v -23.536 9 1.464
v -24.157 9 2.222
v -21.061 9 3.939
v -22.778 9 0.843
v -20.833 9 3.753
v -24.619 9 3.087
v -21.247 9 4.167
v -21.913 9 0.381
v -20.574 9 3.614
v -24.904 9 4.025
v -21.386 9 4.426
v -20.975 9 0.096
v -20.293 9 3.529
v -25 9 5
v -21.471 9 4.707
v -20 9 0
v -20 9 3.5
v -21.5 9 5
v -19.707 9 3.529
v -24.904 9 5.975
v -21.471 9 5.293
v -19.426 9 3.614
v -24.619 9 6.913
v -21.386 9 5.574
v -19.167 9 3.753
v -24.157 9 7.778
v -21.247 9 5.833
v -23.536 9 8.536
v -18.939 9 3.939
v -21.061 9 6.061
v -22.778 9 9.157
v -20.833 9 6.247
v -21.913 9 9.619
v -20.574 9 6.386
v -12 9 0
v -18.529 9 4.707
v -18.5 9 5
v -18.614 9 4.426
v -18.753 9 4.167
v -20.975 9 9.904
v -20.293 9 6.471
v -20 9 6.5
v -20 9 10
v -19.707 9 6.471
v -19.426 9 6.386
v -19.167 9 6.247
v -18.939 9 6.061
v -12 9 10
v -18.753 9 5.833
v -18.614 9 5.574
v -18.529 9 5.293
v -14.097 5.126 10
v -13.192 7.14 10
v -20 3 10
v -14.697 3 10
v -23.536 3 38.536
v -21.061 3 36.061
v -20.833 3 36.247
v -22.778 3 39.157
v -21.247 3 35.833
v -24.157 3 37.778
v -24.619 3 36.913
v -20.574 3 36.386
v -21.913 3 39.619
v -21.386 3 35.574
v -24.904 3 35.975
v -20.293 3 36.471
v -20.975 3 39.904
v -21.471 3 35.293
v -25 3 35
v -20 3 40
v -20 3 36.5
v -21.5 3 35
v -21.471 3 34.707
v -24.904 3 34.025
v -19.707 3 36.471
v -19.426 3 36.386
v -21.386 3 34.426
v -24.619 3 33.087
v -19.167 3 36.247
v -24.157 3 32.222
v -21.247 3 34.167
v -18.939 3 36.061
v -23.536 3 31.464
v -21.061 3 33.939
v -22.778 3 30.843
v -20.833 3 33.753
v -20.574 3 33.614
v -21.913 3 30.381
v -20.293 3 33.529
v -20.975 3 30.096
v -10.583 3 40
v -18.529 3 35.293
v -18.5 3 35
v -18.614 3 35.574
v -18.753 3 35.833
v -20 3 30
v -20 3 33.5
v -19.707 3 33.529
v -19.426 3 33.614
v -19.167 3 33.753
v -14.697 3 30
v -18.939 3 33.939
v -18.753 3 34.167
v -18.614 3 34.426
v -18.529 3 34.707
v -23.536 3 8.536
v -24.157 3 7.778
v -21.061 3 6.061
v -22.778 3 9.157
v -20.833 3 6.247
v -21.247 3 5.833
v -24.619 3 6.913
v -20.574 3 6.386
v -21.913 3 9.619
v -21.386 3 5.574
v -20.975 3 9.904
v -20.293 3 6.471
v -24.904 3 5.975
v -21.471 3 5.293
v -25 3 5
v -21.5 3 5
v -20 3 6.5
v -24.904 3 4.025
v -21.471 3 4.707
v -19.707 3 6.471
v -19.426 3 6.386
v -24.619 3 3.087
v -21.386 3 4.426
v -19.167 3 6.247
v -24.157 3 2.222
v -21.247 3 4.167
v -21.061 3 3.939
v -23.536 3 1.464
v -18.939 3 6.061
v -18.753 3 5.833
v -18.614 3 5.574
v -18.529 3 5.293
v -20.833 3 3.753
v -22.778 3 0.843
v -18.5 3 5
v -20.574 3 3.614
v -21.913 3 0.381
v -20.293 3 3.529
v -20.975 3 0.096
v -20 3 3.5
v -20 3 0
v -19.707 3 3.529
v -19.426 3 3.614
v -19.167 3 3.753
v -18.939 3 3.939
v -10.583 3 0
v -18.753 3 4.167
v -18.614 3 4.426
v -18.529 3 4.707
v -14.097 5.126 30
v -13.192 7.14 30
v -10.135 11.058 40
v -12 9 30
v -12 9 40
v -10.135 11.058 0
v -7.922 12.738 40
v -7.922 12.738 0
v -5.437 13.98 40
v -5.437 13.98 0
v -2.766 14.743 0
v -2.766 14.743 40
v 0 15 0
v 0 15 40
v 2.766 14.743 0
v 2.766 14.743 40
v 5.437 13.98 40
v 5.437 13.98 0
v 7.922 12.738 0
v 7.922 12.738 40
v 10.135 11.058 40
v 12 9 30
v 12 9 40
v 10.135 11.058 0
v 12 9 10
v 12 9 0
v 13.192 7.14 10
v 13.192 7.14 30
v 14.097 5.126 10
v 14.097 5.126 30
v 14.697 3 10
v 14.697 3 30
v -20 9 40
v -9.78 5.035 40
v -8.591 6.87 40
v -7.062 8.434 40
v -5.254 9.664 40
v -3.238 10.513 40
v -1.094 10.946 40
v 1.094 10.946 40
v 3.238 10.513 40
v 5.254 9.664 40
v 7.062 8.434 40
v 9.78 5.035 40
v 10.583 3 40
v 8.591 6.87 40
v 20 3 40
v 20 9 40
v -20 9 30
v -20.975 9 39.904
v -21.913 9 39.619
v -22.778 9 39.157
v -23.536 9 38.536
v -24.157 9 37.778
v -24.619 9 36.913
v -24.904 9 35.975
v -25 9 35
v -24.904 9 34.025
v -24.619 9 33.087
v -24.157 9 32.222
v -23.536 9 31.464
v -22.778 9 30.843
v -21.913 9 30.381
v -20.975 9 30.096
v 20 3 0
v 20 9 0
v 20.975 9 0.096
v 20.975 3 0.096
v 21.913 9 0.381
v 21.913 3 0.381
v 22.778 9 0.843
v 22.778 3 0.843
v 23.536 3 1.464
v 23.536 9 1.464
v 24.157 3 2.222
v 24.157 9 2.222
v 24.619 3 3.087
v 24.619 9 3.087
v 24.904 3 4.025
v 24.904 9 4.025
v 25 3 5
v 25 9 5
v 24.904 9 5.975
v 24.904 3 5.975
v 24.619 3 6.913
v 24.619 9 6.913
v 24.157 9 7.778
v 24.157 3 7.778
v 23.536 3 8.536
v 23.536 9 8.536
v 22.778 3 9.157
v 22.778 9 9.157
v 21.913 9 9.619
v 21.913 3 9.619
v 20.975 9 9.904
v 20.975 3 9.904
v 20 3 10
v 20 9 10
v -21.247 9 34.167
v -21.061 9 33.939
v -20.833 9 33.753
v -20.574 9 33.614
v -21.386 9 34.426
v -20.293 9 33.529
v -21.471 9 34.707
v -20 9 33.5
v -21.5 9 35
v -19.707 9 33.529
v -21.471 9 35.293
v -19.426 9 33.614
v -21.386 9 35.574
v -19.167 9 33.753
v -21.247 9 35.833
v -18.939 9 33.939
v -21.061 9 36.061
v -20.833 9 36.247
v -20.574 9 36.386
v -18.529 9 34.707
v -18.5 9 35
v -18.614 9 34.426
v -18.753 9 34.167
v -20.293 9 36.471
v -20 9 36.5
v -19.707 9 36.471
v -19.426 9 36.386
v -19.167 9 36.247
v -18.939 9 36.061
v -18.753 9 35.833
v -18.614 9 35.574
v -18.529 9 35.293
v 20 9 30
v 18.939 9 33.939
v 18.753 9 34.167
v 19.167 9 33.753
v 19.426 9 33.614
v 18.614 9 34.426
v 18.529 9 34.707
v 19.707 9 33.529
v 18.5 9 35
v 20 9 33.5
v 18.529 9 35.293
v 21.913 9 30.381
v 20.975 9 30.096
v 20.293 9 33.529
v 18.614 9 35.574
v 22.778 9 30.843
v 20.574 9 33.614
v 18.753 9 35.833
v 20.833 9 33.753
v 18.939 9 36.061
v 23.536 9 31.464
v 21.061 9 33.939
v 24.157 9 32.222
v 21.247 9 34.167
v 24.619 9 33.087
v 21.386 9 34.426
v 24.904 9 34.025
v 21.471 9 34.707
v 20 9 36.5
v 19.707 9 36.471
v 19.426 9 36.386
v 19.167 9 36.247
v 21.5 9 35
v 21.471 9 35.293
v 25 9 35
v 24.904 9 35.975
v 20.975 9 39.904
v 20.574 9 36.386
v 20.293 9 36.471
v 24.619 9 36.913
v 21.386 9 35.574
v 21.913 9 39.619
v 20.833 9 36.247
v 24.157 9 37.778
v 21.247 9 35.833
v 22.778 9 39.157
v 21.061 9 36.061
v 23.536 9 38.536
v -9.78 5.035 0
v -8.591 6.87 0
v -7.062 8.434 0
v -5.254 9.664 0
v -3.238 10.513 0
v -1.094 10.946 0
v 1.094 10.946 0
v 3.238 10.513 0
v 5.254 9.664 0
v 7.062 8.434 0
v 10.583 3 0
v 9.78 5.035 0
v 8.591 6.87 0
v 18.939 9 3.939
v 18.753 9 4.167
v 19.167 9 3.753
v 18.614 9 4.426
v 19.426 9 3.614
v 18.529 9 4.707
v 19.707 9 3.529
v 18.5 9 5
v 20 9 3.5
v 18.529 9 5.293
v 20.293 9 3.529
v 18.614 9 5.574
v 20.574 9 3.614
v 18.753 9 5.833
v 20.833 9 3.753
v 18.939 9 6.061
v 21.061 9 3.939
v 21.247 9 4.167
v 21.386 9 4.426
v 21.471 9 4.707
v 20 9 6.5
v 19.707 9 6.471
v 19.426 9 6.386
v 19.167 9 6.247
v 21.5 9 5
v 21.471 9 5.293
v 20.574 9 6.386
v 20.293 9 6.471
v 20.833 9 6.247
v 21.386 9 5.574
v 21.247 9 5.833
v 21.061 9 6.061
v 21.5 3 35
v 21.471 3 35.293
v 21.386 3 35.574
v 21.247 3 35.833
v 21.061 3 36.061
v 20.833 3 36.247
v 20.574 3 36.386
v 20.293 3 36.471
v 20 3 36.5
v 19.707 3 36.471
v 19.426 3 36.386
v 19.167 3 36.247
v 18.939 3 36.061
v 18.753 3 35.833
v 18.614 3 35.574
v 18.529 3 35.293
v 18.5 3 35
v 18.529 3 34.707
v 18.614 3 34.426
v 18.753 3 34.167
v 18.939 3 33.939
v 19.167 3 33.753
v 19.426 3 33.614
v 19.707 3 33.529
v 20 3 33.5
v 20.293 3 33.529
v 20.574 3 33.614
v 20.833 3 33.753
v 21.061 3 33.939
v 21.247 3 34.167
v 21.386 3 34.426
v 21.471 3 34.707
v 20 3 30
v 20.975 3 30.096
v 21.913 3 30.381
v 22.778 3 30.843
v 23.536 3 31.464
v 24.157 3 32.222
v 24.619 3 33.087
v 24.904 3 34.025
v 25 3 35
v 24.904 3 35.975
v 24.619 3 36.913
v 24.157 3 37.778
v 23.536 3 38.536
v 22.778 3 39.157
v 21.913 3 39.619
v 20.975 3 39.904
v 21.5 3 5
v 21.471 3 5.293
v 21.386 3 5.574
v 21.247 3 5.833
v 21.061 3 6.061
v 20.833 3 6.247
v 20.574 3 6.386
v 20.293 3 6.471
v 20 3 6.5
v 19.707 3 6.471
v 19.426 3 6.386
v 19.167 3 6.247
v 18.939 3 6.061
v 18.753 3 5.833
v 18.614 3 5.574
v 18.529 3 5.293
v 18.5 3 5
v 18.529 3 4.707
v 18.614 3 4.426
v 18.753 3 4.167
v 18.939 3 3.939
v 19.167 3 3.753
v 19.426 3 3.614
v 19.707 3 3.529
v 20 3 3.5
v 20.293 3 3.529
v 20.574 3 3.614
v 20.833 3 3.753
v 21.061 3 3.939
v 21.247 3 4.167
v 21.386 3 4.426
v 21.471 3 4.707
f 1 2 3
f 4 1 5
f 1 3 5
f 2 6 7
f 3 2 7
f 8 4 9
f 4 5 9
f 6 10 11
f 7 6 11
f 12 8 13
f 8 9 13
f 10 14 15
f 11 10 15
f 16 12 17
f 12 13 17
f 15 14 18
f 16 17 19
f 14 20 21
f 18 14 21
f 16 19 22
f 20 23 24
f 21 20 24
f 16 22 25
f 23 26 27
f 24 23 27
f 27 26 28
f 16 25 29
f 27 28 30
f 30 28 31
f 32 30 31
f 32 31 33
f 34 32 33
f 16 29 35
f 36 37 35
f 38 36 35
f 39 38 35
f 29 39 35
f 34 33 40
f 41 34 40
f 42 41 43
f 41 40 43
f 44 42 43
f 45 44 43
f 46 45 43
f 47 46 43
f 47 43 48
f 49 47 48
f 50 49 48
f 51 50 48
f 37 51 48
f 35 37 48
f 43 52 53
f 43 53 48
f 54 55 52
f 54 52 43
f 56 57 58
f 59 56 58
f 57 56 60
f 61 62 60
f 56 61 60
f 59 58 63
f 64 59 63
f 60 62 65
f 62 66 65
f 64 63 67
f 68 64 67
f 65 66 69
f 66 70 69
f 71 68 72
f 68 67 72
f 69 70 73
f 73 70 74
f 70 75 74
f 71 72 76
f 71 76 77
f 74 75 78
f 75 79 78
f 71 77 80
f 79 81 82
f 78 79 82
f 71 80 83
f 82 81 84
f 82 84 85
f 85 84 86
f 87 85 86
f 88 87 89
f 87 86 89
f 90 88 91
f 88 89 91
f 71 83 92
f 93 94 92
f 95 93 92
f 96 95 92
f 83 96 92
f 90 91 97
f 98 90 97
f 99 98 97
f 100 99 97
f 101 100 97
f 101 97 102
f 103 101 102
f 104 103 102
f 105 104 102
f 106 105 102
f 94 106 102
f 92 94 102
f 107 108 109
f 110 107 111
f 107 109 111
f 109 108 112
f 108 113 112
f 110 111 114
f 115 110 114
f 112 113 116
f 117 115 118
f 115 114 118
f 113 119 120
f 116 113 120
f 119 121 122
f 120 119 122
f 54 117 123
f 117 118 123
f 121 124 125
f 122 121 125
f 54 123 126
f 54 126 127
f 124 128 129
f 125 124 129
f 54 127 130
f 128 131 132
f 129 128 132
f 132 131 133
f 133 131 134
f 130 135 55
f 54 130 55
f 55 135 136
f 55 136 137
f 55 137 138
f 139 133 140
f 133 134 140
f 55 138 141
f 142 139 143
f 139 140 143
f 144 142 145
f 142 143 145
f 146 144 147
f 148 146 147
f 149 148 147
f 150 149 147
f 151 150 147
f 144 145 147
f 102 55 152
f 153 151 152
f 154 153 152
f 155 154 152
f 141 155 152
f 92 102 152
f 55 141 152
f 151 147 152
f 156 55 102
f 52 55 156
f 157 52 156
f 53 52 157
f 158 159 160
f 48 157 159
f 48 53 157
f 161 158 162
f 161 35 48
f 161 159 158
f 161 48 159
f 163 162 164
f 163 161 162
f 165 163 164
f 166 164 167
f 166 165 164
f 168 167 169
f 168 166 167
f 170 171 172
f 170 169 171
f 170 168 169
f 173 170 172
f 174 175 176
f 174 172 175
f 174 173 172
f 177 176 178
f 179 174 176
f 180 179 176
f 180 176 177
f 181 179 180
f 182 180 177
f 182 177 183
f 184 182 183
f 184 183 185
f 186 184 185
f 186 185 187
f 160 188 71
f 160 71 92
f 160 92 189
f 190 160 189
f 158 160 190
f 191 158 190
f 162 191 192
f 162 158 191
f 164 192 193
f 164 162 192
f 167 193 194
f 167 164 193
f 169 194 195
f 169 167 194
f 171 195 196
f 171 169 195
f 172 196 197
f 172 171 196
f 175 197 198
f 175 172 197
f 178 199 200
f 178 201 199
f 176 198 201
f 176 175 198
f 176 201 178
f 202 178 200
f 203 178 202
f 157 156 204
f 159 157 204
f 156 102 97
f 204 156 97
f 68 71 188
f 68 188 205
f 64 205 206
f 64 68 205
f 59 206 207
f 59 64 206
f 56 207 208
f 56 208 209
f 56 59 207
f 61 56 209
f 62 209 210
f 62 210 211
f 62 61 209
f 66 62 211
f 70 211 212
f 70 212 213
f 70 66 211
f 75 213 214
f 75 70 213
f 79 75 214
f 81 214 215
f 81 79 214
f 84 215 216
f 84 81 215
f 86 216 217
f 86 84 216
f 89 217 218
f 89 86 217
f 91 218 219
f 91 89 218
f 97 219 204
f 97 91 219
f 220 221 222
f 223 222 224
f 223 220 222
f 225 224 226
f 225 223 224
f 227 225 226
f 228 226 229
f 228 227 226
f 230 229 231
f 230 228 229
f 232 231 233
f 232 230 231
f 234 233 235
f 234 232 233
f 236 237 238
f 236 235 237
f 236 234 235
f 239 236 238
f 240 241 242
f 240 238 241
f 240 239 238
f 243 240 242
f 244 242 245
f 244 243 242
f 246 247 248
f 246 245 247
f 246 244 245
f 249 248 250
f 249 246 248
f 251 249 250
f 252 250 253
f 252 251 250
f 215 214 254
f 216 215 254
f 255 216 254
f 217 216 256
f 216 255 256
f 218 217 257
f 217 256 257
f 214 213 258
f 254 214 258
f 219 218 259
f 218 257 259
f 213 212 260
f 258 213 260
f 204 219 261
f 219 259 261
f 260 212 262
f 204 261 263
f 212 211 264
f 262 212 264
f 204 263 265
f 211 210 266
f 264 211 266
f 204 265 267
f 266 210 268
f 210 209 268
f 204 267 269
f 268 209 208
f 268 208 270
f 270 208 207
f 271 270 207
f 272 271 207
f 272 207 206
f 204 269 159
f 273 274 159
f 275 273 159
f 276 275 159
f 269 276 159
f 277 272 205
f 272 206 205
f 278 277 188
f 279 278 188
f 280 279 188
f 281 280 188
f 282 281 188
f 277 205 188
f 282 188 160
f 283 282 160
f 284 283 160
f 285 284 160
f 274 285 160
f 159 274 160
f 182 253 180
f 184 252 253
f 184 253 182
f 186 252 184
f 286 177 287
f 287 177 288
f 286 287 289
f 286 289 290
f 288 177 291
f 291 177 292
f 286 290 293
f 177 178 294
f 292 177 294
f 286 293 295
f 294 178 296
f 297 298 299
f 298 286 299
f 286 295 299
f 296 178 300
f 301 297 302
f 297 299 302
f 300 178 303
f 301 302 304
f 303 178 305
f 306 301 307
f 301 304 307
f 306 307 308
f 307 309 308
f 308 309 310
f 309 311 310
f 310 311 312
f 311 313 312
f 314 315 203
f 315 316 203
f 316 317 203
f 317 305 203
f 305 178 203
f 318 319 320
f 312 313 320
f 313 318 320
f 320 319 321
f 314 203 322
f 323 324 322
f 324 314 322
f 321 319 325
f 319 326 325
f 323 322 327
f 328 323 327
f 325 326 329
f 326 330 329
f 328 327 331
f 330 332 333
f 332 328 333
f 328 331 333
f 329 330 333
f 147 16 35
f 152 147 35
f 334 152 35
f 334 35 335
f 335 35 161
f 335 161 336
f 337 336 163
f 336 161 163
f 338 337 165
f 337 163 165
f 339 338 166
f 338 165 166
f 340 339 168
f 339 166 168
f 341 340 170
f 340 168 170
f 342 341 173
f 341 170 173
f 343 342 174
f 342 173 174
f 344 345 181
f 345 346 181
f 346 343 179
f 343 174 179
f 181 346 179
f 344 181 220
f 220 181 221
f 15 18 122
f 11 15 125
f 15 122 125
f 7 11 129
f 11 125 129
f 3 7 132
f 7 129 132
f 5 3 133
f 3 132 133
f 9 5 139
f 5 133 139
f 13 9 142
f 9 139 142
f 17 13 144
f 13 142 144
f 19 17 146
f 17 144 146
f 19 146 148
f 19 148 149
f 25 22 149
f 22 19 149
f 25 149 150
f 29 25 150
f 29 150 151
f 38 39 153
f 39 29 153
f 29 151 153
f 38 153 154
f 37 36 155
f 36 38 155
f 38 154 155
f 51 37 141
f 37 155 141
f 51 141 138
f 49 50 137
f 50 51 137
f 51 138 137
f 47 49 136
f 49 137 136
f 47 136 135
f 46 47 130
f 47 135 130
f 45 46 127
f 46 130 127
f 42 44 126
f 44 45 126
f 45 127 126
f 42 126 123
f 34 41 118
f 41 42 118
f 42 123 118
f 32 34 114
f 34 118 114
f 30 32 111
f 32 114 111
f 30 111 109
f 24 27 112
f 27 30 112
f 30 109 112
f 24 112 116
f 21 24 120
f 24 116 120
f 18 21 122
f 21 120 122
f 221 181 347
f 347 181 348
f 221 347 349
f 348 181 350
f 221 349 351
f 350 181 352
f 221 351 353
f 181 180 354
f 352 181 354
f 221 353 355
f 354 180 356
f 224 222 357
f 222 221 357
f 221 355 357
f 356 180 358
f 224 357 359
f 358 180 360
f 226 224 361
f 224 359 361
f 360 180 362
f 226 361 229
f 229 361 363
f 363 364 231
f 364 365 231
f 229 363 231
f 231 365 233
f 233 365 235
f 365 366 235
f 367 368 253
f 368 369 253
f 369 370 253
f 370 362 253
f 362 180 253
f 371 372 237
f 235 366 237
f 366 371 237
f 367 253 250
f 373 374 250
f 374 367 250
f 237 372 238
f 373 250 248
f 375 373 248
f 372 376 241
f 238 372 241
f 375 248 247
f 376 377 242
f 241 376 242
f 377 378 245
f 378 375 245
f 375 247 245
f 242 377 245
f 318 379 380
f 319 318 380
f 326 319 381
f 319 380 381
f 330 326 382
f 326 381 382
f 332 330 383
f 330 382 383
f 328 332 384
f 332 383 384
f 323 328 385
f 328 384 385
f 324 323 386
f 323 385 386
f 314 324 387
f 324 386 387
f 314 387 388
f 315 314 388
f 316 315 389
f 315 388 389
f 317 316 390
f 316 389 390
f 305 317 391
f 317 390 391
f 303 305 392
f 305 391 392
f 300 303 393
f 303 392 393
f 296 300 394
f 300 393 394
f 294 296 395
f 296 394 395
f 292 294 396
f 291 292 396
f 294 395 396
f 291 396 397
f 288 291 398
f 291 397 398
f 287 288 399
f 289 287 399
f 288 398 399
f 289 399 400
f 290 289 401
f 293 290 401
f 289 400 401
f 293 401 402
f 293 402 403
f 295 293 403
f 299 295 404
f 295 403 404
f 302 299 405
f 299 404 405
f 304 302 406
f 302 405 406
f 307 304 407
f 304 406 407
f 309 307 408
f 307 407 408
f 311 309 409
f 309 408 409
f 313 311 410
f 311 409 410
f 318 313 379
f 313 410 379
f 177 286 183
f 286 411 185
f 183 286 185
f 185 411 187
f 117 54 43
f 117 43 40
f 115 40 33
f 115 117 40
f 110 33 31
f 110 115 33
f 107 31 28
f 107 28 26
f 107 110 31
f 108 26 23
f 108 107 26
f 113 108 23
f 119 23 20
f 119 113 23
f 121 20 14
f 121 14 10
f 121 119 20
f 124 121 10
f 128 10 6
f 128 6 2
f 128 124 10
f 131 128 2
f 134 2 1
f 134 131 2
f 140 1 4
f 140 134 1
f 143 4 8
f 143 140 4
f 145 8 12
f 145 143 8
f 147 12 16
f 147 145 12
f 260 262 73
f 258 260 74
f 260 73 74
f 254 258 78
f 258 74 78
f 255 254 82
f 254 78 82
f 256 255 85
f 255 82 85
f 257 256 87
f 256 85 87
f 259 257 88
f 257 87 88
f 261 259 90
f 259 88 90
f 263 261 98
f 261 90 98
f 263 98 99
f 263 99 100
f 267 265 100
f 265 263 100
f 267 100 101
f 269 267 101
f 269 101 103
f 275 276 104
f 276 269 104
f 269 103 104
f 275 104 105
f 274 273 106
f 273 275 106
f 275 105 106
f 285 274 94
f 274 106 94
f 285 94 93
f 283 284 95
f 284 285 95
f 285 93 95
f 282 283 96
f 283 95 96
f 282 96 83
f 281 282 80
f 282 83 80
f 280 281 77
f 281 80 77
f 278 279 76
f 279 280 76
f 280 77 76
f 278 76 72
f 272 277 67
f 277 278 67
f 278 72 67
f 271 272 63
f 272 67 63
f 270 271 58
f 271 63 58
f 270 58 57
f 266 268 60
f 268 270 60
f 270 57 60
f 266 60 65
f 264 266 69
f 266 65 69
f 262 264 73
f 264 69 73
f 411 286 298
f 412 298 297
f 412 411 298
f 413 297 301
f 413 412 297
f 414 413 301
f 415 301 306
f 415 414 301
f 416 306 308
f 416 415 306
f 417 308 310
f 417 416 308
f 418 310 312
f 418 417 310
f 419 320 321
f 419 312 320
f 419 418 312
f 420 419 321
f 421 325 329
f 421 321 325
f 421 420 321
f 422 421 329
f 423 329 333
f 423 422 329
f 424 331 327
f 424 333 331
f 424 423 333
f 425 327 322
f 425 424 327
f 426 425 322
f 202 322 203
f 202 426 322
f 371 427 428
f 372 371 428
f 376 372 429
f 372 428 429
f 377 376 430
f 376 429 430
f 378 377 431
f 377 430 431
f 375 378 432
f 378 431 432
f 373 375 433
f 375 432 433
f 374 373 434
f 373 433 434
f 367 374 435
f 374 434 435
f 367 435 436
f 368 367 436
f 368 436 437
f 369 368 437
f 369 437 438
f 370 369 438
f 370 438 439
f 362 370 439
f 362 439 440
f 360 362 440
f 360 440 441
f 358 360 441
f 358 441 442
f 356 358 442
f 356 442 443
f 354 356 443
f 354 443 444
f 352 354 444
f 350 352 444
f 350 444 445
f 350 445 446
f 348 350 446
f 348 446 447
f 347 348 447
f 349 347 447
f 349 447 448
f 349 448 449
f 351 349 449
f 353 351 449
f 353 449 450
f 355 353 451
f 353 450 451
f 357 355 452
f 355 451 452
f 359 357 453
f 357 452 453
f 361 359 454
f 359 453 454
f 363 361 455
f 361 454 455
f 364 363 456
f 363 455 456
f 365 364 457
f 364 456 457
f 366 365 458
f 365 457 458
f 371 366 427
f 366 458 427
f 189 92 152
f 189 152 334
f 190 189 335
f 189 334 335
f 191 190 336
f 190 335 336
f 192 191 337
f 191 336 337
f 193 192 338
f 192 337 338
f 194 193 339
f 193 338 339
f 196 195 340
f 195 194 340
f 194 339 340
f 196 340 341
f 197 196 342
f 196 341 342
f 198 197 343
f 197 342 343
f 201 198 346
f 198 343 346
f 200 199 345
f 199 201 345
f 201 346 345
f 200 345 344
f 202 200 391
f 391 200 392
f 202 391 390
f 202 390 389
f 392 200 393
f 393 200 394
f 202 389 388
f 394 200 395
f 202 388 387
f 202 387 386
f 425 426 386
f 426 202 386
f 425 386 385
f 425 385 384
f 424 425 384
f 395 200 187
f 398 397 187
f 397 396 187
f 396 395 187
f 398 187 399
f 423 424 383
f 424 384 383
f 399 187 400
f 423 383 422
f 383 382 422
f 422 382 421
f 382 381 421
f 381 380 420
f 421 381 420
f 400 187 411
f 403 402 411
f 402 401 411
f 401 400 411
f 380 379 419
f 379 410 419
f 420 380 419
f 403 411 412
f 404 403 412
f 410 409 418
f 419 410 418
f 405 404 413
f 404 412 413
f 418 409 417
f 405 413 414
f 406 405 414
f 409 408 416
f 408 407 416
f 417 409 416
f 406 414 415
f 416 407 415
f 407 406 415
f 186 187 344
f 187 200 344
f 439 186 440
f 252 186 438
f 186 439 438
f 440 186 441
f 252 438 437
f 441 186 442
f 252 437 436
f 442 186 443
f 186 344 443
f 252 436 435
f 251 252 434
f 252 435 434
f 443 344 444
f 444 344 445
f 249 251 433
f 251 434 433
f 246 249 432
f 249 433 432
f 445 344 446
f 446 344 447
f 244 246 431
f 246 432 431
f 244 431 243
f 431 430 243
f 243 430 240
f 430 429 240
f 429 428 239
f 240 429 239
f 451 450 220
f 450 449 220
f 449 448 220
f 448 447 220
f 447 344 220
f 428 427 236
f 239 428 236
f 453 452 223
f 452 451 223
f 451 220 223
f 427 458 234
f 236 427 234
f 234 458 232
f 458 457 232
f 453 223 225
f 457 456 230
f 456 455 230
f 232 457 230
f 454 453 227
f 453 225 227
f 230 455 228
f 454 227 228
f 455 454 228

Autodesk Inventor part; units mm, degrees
ref_plane "YZ Plane" through (0, 0, 0) normal (1, 0, 0) x (0, 1, 0)
ref_plane "XZ Plane" through (0, 0, 0) normal (0, 1, 0) x (-1, 0, 0)
ref_plane "XY Plane" through (0, 0, 0) normal (0, 0, 1) x (1, 0, 0)
sketch "Sketch1" plane through (0, 0, 0) normal (0, 0, 1) x (1, 0, 0)
  circle A0 centre (0, 0) radius 11
  line L0 (-10.583, 3) -> (10.583, 3)
  circle A1 centre (0, 0) radius 15
  line L1 (-14.6969, 3) -> (14.6969, 3)
  dimension "d0" = 22
  dimension "d1" = 3
  dimension "d2" = 4
extrude "Extrusion1" add sketch "Sketch1" along normal blind 40 contours A0 L1 A1 picked at (-0.4305, 13.5639)
sketch "Sketch2" plane through (10.583, 3, 0) normal (0, -1, 0) x (1, 0, 0)
  line L0 (-10.583, 0) -> (9.417, 0)
  line L1 (-10.583, 0) -> (-10.583, 40)
  line L2 (-21.166, 40) -> (0, 40) projected
  line L3 (-10.583, 20) -> (9.417, 20)
  line L4 (9.417, 20) -> (9.417, 5)
  circle A0 centre (9.417, 5) radius 1.5
  circle A1 centre (9.417, 5) radius 5
  line L5 (0, 0) -> (4.1139, 0) projected
  line L6 (9.417, 10) -> (4.1139, 10)
  line L7 (4.1139, 10) -> (4.1139, 0)
  line L8 (4.1139, 0) -> (9.417, 0)
  line L9 (9.417, 0) -> (9.417, 10)
  line L10 (-10.583, 40) -> (9.417, 40)
  circle A2 centre (9.417, 35) radius 1.5
  circle A3 centre (9.417, 35) radius 5
  line L11 (9.417, 30) -> (4.1139, 30)
  line L12 (9.417, 40) -> (9.417, 30)
  line L13 (0, 0) -> (4.1139, 0) projected
  line L14 (4.1139, 0) -> (4.1139, 40) projected
  line L15 (0, 40) -> (4.1139, 40) projected
  line L16 (0, 0) -> (0, 40) projected
  line L17 (4.1139, 30) -> (0, 30)
  line L18 (4.1139, 10) -> (0, 10)
  line L19 (0, 0) -> (0, 40) projected
  point P0 (0, 20)
  point P1 (4.1139, 20)
  dimension "d8" = 10
  dimension "d5" = 20
  dimension "d6" = 15
  dimension "d7" = 3
extrude "Extrusion2" add sketch "Sketch2" against normal blind 6 contours L16 L18 L7 L0 | L7 L6 A1 L0 | L9 A0 L4 A1 | A1 L4 A0 L9 | L10 L14 L17 L16 | L10 A3 L11 L14 | L12 A2 A3 | A3 L12 A2
mirror "Mirror1" about plane through (0, 0, 0) normal (1, 0, 0) of "Extrusion2"
properties part number "Shaft_conn_Tensioner"
